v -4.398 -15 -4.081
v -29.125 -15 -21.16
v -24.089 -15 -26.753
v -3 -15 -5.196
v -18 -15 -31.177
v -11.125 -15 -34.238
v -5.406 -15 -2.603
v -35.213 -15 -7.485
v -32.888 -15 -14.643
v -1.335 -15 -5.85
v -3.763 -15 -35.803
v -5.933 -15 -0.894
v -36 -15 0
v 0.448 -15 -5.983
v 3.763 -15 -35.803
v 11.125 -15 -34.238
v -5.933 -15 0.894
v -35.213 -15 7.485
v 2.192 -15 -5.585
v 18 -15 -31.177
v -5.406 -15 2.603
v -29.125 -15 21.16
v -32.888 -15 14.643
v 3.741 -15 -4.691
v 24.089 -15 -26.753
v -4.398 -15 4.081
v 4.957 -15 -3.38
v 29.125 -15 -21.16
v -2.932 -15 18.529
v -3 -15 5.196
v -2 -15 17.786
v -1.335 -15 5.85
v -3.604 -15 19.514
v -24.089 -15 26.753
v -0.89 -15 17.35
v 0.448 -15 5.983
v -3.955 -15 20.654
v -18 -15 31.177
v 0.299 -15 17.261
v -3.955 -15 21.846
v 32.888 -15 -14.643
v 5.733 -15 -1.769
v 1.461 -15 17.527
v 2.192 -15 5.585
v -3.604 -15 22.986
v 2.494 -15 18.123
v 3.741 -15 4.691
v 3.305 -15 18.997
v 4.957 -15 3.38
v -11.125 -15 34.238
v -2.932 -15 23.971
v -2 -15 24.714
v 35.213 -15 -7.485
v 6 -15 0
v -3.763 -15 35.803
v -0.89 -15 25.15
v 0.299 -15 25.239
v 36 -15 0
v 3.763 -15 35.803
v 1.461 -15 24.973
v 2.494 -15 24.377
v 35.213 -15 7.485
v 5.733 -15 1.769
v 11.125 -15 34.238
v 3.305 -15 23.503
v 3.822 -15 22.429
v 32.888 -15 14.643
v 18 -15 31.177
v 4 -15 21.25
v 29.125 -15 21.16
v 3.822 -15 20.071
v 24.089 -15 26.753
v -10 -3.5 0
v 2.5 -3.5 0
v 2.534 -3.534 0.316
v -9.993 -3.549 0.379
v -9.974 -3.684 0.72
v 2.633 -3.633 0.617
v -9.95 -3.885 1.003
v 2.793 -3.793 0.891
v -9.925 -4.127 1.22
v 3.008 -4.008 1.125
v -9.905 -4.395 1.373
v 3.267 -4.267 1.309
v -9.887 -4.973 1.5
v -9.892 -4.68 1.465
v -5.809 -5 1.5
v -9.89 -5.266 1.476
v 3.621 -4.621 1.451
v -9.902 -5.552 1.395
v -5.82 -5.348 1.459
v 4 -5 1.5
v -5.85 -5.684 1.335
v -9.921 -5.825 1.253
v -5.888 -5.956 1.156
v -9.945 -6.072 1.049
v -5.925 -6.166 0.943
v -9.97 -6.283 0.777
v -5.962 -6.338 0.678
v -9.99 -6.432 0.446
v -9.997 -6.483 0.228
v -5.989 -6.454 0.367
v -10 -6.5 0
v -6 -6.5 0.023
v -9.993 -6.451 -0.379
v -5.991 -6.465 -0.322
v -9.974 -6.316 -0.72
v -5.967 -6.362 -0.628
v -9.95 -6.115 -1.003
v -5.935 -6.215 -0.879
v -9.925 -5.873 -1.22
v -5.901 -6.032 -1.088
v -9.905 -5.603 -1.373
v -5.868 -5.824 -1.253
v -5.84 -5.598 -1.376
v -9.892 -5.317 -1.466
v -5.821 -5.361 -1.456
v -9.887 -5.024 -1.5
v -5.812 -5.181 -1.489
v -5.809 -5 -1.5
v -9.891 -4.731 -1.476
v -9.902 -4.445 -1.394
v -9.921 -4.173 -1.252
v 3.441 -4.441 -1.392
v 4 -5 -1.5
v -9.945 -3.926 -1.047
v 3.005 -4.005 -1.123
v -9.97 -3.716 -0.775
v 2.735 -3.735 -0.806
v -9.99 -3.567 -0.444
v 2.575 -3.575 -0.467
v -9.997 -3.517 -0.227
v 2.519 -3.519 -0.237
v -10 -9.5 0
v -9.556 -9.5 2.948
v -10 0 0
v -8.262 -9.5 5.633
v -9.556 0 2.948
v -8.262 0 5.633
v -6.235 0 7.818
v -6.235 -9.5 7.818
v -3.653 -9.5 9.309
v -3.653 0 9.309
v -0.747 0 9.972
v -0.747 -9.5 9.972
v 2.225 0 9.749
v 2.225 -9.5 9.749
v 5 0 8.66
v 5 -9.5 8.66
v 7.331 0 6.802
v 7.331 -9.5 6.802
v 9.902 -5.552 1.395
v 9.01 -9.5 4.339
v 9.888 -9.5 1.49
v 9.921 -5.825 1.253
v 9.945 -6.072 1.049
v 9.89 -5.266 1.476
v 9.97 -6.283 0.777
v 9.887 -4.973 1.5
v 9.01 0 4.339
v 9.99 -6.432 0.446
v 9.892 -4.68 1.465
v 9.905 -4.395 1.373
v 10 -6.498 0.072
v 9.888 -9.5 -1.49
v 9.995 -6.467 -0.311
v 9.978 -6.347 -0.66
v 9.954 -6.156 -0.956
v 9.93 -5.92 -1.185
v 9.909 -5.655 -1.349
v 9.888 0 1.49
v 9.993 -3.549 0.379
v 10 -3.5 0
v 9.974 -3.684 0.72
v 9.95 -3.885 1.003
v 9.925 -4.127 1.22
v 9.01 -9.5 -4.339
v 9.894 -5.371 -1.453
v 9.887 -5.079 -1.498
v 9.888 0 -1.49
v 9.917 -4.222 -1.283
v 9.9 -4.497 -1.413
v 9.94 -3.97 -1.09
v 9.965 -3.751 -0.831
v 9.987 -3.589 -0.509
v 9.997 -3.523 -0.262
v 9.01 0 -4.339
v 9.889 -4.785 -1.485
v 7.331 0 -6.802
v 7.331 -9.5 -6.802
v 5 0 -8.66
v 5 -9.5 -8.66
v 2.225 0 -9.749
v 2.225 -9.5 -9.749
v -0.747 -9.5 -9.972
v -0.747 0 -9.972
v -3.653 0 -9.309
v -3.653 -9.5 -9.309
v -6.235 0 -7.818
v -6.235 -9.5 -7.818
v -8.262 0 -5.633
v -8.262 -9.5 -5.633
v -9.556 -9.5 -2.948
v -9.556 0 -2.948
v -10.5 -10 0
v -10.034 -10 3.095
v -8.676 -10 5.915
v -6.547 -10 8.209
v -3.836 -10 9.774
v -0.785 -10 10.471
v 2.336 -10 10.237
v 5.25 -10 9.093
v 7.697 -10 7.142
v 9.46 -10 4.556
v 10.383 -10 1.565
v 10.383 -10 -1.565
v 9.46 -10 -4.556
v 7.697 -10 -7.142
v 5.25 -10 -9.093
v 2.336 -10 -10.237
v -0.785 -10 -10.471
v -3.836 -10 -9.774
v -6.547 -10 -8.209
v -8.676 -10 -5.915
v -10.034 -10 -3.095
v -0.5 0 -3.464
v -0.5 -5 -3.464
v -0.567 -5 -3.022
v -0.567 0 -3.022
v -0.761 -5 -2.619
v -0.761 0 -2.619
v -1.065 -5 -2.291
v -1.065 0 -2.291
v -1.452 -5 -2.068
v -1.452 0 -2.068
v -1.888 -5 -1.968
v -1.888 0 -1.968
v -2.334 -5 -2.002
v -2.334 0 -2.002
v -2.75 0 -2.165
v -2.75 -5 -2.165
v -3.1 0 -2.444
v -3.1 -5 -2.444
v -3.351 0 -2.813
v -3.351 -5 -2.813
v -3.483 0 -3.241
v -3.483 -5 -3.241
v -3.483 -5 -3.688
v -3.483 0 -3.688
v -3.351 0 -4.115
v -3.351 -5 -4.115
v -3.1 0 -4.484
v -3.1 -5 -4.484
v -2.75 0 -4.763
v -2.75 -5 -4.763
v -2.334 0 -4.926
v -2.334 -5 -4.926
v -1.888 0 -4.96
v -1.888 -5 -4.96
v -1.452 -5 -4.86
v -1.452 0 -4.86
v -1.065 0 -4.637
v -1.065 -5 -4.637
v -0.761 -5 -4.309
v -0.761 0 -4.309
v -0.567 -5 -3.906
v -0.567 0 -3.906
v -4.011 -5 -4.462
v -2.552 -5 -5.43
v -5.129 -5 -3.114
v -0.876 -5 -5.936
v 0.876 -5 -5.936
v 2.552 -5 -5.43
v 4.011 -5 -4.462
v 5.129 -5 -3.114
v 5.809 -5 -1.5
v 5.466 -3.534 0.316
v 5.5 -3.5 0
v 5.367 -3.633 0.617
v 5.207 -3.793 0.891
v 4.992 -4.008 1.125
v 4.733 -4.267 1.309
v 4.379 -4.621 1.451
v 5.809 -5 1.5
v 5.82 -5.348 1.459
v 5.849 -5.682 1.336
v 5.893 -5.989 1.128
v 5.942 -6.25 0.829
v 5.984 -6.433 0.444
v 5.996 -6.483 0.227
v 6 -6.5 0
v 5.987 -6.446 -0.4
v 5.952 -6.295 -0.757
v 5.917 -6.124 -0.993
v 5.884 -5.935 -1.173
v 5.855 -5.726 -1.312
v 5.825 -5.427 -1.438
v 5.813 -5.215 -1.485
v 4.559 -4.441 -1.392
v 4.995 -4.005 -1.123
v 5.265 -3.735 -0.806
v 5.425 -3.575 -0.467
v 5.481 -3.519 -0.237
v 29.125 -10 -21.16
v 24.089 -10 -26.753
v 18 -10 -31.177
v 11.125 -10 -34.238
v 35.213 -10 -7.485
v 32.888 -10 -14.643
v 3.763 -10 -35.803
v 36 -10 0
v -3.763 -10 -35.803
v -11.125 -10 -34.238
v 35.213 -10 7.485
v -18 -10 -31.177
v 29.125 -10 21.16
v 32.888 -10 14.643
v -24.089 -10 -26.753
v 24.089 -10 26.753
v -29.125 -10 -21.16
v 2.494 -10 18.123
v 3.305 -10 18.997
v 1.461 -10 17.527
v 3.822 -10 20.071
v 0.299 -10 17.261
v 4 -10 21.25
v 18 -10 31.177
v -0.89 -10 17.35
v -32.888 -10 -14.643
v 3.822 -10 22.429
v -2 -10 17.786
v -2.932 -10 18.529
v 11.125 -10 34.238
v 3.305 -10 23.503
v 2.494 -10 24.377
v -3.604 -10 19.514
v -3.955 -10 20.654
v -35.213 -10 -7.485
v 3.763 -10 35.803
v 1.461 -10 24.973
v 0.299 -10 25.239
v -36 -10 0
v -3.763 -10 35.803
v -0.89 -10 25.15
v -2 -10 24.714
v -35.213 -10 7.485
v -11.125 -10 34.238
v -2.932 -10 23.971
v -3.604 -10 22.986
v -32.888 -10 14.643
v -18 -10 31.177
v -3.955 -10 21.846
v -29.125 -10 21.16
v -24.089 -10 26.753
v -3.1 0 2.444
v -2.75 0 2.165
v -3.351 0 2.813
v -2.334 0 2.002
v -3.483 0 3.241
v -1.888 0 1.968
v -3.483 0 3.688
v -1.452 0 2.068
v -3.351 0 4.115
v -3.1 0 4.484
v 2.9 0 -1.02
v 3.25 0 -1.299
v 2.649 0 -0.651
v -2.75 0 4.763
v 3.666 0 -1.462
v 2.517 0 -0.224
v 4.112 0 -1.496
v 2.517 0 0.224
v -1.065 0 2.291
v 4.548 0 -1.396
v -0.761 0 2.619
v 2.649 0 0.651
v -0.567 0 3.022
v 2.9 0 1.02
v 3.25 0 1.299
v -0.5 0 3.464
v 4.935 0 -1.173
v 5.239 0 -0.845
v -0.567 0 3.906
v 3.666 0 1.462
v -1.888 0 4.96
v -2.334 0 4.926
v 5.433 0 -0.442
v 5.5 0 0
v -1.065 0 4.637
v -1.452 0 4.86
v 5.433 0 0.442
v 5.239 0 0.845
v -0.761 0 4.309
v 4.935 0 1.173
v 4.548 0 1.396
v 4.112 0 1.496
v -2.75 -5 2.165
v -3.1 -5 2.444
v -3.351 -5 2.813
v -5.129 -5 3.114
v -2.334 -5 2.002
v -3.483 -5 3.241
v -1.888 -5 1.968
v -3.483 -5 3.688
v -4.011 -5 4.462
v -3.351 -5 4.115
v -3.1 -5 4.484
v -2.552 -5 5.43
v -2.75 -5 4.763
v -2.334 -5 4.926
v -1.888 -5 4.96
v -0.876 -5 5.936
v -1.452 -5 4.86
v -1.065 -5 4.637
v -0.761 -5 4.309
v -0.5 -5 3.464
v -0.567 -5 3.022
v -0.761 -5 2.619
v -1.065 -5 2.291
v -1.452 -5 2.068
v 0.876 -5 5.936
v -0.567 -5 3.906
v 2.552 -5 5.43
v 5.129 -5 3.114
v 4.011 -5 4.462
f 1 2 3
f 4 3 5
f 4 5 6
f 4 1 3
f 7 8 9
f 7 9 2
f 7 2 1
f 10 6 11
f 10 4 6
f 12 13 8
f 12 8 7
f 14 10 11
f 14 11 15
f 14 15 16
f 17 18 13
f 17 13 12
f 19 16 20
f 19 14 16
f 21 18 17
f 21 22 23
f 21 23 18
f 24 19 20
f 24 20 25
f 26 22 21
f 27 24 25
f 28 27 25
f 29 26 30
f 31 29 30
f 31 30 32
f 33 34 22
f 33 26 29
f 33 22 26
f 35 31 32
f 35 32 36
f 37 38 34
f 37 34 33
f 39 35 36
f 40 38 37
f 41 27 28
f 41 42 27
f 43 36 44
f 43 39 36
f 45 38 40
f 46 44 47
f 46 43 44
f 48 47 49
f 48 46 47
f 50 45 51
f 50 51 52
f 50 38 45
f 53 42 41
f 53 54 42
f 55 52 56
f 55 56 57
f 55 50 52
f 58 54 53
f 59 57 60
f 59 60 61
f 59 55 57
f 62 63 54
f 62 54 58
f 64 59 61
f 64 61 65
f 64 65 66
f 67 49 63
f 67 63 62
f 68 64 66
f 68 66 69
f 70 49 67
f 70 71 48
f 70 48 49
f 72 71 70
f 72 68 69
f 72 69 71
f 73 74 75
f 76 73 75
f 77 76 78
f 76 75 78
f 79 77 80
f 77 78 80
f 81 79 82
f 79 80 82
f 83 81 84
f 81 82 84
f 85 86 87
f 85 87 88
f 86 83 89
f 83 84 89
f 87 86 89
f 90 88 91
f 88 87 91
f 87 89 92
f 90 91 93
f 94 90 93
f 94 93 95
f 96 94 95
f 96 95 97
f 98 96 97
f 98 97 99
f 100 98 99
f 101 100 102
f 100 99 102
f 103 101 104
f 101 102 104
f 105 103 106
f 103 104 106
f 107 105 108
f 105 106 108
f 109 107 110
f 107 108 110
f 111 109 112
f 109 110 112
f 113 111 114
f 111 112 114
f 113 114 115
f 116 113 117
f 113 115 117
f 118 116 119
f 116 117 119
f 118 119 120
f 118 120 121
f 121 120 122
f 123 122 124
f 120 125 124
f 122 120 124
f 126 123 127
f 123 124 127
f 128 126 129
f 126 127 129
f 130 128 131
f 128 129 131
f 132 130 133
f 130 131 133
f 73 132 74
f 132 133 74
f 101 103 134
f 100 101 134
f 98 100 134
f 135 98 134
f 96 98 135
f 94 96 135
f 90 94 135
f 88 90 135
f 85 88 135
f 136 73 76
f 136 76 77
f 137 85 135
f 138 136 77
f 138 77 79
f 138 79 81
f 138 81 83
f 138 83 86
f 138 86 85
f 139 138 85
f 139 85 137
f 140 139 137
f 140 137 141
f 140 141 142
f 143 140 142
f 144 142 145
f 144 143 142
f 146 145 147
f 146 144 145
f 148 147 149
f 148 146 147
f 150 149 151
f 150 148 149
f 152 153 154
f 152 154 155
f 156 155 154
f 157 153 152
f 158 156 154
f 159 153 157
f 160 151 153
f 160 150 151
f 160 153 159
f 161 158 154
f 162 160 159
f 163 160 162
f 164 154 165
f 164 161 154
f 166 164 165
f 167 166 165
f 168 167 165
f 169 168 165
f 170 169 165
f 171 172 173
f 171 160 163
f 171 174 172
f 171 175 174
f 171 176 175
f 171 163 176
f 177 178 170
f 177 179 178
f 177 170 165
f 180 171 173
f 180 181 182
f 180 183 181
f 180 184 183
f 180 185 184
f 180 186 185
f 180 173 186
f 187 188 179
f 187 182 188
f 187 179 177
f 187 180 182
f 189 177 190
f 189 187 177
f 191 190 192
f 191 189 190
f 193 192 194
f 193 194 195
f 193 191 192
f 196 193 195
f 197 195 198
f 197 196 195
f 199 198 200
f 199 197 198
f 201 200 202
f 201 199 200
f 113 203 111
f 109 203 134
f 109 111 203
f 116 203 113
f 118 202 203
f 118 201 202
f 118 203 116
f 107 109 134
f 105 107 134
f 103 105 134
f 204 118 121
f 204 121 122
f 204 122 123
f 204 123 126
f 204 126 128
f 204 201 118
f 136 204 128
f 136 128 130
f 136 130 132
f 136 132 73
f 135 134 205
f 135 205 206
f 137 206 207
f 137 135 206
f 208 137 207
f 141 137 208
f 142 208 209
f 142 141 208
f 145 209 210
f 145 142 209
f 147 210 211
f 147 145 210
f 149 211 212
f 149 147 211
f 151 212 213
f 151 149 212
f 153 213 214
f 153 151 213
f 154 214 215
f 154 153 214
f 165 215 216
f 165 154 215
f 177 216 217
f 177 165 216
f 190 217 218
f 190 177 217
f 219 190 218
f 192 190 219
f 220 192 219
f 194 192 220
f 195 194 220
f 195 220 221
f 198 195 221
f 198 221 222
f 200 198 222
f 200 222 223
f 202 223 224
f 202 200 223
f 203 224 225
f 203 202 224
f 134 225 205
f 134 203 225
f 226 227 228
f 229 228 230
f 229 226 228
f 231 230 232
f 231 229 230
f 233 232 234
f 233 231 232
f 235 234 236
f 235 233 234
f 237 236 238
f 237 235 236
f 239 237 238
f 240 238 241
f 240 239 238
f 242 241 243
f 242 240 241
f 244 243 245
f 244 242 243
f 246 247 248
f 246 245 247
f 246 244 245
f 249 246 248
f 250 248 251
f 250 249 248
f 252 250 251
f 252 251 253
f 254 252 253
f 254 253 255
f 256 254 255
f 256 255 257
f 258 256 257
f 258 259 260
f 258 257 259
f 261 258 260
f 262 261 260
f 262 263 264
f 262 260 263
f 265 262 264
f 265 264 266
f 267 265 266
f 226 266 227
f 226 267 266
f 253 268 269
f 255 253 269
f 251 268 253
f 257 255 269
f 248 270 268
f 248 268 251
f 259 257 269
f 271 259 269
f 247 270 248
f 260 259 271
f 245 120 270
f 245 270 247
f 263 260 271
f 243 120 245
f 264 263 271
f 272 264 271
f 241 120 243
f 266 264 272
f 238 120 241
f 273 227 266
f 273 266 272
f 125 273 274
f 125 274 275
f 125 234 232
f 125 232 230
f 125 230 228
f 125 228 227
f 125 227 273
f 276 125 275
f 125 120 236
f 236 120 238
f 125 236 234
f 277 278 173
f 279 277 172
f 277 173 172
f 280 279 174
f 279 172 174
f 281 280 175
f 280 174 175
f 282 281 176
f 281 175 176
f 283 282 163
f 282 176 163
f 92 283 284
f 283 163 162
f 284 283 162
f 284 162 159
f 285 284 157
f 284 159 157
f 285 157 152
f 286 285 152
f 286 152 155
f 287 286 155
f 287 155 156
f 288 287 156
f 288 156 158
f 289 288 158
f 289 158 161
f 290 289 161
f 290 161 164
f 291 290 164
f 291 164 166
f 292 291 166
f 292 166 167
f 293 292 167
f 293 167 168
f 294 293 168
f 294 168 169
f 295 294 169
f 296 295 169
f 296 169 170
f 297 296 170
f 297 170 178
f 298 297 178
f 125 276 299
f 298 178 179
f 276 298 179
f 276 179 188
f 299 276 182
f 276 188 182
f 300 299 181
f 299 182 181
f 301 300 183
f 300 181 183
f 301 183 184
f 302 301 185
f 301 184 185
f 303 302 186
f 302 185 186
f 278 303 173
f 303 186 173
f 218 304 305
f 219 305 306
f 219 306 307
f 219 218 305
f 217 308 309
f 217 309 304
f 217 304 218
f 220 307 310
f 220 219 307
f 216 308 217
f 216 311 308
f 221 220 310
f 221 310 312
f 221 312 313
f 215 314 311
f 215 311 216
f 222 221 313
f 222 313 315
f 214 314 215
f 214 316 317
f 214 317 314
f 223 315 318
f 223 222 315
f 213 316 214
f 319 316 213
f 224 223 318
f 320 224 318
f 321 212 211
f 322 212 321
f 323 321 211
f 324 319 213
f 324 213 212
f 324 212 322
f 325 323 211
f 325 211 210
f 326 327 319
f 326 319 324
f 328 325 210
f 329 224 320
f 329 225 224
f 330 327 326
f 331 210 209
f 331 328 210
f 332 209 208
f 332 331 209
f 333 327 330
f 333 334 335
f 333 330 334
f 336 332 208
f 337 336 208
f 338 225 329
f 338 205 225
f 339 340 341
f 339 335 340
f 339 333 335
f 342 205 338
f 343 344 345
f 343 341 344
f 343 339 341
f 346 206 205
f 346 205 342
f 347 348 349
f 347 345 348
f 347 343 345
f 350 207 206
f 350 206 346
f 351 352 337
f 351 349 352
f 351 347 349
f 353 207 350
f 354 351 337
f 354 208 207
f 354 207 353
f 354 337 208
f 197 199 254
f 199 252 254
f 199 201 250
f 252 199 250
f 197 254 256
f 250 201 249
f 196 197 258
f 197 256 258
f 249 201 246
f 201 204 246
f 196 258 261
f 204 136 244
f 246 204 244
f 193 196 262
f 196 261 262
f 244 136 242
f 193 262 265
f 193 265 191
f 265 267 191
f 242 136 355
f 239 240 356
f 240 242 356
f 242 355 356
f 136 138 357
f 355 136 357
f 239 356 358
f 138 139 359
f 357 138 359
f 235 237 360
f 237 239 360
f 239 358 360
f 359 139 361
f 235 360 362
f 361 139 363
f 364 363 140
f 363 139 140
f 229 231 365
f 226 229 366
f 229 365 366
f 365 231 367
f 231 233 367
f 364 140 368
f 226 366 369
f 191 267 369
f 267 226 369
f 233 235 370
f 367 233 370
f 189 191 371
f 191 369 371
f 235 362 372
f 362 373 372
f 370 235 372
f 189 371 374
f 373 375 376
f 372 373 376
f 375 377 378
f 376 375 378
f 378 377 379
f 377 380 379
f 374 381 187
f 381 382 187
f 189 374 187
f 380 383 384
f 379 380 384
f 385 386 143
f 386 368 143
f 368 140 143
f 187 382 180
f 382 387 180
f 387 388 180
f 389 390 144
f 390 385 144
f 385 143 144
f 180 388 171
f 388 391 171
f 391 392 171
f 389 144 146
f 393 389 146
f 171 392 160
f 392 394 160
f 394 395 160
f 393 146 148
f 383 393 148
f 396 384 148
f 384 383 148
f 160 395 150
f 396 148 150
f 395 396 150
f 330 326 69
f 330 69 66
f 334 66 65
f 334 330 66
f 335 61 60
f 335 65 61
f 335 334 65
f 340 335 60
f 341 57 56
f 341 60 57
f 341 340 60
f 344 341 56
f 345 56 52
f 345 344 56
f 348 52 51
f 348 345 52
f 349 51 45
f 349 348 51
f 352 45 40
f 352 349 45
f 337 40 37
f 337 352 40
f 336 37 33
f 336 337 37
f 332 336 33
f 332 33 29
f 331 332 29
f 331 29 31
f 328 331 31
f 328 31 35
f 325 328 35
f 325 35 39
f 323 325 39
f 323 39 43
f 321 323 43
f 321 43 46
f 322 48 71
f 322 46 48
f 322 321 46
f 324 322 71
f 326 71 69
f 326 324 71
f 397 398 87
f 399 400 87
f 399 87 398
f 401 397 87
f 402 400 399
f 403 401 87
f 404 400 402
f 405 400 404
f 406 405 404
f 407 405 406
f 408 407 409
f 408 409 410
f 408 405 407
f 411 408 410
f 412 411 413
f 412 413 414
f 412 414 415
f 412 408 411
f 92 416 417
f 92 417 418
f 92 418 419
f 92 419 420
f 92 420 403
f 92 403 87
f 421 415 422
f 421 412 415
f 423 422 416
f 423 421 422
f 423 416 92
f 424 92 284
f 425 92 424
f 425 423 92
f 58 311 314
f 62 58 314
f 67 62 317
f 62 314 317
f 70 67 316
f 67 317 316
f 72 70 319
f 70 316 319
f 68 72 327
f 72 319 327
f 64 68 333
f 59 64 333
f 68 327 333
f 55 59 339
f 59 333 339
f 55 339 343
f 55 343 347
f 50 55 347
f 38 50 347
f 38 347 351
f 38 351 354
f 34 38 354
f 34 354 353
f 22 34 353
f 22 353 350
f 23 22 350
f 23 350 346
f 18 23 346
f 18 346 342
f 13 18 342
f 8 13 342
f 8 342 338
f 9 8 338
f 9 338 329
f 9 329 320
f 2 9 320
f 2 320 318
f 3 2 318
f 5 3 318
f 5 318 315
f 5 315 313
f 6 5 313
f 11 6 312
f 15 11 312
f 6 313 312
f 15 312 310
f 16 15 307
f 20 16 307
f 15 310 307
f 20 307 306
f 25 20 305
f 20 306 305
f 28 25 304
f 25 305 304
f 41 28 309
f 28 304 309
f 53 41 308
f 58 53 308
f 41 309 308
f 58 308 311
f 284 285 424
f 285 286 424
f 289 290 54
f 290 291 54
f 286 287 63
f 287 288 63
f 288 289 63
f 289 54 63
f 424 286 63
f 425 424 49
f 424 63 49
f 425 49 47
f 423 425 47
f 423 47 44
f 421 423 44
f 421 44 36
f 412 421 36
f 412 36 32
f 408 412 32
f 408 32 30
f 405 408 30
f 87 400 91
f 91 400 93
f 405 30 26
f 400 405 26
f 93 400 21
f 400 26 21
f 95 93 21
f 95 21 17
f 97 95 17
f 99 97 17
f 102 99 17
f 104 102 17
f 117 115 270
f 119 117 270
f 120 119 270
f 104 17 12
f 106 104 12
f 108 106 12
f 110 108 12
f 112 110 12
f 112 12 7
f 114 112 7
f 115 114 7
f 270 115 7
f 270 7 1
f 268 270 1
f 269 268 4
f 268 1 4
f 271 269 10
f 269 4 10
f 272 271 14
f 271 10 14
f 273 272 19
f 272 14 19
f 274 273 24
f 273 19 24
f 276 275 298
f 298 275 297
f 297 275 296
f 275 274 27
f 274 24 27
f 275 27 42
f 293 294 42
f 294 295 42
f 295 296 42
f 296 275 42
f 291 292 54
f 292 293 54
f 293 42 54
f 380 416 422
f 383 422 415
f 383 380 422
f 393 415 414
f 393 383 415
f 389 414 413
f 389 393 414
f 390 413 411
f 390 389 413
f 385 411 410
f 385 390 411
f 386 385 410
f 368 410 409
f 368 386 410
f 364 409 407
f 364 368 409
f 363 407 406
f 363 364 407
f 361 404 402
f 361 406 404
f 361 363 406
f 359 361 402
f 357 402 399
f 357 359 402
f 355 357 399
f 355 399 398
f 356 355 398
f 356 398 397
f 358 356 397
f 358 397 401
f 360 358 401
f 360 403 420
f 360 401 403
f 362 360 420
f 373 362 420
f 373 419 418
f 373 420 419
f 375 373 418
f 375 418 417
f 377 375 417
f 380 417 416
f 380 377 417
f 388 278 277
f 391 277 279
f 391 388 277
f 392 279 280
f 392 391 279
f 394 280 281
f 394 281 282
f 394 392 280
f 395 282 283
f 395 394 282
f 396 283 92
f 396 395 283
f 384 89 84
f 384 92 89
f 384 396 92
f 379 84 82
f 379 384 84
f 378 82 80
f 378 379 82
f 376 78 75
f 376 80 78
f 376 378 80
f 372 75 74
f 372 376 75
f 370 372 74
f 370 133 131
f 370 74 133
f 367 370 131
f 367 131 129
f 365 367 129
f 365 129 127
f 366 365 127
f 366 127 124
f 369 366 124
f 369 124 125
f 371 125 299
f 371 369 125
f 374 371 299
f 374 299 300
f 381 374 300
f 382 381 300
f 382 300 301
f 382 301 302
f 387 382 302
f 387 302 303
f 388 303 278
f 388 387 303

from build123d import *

# Parameters (mm, degrees)
F0_R          = 36
F1_DEPTH      = 15
F2_R          = 65
F2_R_2        = 10
F3_DEPTH      = 10
F4_SIZE       = 0.5
F5_R          = 1.5
F6_DEPTH      = 25
F6_DEPTH_BACK = 25
F7_R          = 4
F8_DEPTH      = 25
F9_R          = 1.5
F10_DEPTH     = 15
F11_R         = 6
F12_DEPTH     = 10


with BuildPart() as f1:
    # F0 (on Front) → F1 (new body)
    with BuildSketch(Plane.XZ):
        Circle(F0_R)
    extrude(amount=F1_DEPTH)

    # F2 (on face) → F3 (cut)
    with BuildSketch(Plane(origin=(0, 0, 0), x_dir=(-1, 0, 0), z_dir=(0, 1, 0))):
        Circle(F2_R)
        Circle(F2_R_2, mode=Mode.SUBTRACT)
    extrude(amount=-F3_DEPTH, mode=Mode.SUBTRACT)

    # F4
    f4_edges = [f1.edges().sort_by_distance(p)[0] for p in [
        (10, -10, 0),
    ]]
    chamfer(f4_edges, length=F4_SIZE)

    # F5 (on Right) → F6 (cut, two sides)
    with BuildSketch(Plane.YZ) as f6_sk:
        with Locations((-5, 0)):
            Circle(F5_R)
    extrude(amount=F6_DEPTH, mode=Mode.SUBTRACT)
    extrude(f6_sk.sketch, amount=-F6_DEPTH_BACK, mode=Mode.SUBTRACT)

    # F7 (on Front) → F8 (cut)
    with BuildSketch(Plane.XZ):
        with Locations((0, 21.25)):
            Circle(F7_R)
    extrude(amount=F8_DEPTH, mode=Mode.SUBTRACT)

    # F9 (on Front) → F10 (cut)
    with BuildSketch(Plane.XZ):
        with Locations((-2, 3.464102)):
            Circle(F9_R)
        with Locations((-2, -3.464102)):
            Circle(F9_R)
        with Locations((4, 0)):
            Circle(F9_R)
    extrude(amount=F10_DEPTH, mode=Mode.SUBTRACT)

    # F11 (on face) → F12 (cut)
    with BuildSketch(Plane.XZ.offset(15)):
        Circle(F11_R)
    extrude(amount=-F12_DEPTH, mode=Mode.SUBTRACT)


solid = f1.part
